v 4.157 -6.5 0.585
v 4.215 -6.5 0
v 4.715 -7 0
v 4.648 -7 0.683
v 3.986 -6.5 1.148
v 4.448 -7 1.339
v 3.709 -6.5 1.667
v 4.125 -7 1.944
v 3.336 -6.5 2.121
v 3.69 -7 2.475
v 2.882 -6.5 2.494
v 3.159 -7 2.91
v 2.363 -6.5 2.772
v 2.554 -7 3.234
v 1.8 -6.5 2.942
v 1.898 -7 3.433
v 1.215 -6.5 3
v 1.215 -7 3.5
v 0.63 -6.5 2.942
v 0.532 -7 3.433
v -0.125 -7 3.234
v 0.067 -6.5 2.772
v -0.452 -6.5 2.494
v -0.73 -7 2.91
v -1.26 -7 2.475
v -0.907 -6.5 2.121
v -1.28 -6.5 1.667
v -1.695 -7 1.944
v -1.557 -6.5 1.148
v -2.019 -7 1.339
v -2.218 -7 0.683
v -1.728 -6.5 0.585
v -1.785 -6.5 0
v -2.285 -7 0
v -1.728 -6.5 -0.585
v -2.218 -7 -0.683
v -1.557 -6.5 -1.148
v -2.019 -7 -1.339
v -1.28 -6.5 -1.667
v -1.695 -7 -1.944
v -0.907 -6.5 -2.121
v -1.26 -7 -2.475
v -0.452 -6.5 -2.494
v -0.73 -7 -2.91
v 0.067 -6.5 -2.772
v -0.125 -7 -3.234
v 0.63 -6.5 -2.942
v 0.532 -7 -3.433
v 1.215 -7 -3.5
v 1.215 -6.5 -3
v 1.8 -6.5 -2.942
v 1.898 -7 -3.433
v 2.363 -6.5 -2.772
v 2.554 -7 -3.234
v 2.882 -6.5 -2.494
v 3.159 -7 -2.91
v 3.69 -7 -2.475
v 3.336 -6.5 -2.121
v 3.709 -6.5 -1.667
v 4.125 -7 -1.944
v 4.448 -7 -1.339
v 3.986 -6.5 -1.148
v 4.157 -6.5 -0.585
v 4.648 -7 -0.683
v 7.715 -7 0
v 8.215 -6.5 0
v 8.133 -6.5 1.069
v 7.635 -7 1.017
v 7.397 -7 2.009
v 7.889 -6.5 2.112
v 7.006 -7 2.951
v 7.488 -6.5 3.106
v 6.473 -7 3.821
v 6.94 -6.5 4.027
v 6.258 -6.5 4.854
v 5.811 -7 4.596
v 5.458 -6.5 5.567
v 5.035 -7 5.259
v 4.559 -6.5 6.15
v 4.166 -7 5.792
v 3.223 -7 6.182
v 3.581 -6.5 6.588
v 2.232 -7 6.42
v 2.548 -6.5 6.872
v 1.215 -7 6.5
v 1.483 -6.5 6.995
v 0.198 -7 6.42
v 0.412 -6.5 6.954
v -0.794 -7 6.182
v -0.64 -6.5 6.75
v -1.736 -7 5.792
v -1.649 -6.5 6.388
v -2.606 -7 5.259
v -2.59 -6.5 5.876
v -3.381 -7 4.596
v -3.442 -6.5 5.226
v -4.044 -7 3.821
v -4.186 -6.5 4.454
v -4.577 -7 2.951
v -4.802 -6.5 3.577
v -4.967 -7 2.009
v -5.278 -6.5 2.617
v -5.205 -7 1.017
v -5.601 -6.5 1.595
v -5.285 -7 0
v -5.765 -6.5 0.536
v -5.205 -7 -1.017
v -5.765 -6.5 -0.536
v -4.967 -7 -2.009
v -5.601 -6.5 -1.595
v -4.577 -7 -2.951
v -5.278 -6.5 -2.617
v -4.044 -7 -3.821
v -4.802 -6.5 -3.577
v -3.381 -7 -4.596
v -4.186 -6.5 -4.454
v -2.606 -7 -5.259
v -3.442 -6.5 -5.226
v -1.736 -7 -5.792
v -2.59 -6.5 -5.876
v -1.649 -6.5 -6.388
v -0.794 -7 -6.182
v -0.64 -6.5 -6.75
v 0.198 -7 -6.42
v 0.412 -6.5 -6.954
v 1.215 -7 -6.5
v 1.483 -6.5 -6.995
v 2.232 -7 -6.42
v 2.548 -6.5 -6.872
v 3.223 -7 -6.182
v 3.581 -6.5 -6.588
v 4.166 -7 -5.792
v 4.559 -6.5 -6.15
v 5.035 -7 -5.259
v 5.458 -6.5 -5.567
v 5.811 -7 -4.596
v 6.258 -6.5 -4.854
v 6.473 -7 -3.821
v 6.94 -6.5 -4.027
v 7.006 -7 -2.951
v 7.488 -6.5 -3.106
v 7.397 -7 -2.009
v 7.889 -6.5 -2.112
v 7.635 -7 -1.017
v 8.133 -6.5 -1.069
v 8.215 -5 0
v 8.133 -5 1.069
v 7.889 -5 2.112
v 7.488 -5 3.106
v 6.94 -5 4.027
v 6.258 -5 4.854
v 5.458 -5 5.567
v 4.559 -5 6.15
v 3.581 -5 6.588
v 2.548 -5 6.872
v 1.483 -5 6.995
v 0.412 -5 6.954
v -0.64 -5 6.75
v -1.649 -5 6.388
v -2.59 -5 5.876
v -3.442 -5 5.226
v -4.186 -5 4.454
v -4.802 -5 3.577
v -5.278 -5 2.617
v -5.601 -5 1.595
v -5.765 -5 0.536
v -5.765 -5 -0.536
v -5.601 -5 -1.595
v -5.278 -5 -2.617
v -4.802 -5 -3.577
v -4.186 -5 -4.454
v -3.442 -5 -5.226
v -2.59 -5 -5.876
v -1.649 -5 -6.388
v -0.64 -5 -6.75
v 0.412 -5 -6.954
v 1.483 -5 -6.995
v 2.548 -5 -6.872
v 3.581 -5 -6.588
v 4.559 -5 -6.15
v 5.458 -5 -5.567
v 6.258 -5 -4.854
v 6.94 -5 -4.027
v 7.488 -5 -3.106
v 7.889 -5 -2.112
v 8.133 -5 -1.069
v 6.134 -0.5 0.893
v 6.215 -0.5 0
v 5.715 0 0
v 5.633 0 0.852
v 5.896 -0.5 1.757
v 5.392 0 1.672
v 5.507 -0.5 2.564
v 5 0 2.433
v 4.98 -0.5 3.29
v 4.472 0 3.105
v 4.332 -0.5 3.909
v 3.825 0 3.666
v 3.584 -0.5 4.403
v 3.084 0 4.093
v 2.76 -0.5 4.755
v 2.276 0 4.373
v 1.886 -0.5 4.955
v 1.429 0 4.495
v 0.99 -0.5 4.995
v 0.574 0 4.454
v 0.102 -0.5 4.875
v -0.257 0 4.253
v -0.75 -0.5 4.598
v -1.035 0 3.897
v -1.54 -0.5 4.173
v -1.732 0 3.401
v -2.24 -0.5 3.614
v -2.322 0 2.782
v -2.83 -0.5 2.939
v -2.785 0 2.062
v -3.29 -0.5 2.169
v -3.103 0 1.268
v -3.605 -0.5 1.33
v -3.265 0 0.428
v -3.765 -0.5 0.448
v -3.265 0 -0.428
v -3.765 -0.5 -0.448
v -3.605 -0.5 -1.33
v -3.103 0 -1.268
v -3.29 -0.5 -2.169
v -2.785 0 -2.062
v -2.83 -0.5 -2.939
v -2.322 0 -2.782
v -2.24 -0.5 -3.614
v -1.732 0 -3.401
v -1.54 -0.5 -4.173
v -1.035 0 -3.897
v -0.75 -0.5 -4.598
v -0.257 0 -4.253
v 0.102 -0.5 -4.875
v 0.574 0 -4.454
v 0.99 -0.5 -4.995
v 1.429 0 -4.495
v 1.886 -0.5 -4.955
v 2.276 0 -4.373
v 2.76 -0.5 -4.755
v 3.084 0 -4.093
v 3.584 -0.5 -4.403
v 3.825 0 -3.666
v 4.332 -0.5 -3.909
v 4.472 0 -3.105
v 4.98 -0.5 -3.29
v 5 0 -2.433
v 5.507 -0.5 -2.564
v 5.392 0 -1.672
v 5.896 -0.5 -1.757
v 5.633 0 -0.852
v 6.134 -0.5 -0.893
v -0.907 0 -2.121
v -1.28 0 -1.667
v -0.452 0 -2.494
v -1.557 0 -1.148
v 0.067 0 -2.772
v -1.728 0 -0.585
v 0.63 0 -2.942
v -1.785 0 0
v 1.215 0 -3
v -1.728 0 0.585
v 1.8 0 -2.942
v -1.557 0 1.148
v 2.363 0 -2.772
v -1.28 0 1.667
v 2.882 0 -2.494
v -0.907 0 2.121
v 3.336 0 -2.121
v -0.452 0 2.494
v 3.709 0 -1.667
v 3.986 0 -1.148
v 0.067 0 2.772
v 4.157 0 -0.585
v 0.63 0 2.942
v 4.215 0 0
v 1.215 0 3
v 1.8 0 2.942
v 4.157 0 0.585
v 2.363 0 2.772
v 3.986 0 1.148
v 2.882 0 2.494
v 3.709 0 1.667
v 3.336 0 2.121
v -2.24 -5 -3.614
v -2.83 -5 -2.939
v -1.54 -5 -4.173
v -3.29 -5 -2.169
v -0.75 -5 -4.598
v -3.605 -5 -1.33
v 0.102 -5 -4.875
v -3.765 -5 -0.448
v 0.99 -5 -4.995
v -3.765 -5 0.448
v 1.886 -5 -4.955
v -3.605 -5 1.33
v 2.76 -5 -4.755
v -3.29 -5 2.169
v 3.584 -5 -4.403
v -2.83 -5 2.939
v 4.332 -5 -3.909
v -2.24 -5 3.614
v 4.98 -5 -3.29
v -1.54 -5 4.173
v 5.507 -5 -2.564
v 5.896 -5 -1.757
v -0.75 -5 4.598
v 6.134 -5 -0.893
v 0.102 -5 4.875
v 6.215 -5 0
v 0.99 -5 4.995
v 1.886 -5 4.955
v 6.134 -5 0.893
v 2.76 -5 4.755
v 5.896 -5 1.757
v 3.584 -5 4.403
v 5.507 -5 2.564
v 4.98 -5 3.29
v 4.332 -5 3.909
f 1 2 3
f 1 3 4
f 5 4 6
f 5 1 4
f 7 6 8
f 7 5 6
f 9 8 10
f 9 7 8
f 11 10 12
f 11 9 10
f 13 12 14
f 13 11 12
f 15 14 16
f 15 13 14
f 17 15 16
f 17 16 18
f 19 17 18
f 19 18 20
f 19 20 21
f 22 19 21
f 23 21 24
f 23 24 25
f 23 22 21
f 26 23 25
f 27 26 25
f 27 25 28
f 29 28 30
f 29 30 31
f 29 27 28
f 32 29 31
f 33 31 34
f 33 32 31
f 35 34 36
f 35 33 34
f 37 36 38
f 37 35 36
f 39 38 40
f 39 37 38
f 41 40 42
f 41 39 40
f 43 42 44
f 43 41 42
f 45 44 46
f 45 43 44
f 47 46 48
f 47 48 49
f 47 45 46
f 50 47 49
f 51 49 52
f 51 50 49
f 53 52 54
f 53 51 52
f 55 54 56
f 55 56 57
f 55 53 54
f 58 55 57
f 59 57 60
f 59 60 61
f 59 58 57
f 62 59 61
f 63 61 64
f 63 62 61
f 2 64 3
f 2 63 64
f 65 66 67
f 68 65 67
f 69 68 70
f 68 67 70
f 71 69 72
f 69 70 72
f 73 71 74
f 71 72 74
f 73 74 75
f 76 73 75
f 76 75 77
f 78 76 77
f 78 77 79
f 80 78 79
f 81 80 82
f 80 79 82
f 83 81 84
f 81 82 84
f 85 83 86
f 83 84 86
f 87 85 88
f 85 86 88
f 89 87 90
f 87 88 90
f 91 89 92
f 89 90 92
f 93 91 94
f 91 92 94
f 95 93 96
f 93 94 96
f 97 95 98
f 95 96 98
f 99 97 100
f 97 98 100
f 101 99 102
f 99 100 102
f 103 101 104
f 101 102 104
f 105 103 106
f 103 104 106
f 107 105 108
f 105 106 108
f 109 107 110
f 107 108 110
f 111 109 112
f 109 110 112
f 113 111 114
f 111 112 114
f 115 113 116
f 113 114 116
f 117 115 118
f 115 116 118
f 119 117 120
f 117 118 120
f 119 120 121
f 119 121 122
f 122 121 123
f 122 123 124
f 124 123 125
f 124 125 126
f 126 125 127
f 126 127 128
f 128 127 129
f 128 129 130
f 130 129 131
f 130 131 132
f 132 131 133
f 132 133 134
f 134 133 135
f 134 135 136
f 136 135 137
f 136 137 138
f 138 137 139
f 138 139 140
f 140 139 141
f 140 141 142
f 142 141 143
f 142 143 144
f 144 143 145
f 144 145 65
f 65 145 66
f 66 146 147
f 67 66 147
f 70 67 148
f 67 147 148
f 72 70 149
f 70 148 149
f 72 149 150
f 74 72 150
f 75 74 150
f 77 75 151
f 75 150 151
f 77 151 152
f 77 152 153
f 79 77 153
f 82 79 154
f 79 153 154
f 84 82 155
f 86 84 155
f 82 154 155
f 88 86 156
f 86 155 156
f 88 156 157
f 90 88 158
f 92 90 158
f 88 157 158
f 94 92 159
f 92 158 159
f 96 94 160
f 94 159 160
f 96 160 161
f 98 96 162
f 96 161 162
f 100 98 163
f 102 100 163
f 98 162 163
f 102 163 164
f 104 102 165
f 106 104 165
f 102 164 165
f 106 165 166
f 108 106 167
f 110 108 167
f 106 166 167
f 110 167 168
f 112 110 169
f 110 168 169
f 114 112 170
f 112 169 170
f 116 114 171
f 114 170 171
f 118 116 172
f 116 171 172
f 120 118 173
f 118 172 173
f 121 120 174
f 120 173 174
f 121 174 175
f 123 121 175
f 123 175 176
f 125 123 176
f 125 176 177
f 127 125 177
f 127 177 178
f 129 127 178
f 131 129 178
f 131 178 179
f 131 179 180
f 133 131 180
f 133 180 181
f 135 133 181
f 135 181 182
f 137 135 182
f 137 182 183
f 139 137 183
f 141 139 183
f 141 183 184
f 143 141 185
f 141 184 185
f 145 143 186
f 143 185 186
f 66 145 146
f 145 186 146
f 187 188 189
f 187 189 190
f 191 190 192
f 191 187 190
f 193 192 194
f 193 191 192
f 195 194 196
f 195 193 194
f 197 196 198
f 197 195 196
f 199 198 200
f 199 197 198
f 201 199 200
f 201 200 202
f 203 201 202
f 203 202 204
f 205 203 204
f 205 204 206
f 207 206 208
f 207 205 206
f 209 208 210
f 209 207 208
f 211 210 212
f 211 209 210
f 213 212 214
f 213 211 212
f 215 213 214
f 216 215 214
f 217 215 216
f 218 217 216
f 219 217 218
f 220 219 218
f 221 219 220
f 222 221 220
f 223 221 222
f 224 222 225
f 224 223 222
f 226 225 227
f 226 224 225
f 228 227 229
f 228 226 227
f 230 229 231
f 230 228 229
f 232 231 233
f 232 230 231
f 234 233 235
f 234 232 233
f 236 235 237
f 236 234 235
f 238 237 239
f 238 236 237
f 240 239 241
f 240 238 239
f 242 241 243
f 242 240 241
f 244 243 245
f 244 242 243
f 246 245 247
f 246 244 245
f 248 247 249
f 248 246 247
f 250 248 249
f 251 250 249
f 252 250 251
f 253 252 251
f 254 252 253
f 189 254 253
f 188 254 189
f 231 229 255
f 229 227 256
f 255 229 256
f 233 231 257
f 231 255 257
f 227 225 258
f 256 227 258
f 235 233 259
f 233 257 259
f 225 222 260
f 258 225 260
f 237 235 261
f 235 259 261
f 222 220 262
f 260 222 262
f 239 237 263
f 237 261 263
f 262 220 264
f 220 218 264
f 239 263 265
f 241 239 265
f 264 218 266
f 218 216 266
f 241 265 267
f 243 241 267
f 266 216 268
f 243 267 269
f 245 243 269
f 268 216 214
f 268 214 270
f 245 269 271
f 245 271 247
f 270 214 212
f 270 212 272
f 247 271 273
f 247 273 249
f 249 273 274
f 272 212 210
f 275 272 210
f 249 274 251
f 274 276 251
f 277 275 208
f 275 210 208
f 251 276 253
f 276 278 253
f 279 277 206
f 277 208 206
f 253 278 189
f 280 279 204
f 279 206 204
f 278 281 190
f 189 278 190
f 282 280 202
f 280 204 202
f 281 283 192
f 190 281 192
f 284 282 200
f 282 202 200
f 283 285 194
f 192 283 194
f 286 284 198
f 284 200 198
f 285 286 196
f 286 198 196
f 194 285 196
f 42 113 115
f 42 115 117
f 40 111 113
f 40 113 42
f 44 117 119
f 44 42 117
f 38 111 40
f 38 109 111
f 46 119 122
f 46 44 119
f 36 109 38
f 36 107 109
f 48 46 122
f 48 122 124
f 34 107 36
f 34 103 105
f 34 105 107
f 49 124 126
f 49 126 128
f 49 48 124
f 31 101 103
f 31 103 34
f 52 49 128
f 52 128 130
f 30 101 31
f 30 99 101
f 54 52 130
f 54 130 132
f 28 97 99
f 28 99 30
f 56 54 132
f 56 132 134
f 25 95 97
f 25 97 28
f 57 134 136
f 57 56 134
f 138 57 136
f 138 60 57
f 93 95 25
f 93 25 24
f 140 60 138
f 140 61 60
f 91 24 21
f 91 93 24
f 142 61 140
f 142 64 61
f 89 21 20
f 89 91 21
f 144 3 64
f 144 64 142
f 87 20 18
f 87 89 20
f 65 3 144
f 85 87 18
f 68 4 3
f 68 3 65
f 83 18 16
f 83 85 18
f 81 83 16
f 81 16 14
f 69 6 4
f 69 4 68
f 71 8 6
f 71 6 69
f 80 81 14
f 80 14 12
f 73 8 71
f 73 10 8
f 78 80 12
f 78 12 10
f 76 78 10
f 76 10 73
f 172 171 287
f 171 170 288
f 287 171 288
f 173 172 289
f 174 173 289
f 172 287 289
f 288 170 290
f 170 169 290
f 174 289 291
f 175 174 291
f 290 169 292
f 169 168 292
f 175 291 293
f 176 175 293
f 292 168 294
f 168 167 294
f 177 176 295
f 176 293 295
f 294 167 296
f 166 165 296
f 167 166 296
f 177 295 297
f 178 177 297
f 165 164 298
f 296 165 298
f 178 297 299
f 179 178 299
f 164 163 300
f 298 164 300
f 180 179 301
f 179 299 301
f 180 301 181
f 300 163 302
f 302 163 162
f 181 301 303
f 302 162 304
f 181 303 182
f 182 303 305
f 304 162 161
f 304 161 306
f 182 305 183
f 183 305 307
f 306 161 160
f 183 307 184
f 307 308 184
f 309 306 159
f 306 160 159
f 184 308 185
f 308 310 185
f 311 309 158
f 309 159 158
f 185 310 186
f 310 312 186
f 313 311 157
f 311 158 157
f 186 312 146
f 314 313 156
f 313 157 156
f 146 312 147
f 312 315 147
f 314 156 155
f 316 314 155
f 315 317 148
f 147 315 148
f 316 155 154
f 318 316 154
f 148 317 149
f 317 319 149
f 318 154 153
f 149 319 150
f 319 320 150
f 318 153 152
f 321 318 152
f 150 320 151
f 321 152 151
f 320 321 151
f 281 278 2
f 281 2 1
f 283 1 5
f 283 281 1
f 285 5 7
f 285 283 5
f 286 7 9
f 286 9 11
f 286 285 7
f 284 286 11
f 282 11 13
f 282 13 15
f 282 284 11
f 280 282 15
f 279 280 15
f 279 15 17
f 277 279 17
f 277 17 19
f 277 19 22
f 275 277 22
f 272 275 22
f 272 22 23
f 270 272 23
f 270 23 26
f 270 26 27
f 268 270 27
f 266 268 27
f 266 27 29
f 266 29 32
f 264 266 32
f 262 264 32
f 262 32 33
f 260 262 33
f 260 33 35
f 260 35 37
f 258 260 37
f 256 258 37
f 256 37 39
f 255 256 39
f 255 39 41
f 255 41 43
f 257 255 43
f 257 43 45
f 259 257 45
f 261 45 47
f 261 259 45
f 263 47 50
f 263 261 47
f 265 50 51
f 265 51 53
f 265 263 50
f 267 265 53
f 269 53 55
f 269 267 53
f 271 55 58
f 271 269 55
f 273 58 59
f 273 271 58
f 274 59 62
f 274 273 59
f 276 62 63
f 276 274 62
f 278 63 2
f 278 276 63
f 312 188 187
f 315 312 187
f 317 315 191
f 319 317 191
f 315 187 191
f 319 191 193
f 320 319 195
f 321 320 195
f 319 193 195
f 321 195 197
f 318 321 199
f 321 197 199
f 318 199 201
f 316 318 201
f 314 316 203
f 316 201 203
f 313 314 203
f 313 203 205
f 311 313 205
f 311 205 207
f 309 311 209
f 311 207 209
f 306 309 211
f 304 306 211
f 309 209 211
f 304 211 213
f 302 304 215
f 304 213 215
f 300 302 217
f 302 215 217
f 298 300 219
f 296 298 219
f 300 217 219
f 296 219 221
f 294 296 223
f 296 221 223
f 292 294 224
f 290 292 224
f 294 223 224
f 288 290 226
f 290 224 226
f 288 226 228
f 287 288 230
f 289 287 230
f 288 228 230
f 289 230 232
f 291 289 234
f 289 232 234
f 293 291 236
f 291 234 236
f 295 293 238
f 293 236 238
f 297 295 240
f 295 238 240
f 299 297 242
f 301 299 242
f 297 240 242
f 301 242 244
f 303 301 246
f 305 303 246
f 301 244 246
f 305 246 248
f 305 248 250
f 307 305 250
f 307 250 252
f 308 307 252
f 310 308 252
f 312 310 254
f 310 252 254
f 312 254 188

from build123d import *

# Parameters (mm, degrees)
F0_R     = 5
F0_R_2   = 3
F1_DEPTH = 5
F2_R     = 6.9999998716
F2_R_2   = 5
F2_R_3   = 3
F3_DEPTH = 2
F4_SIZE  = 0.5
F5_SIZE  = 0.5
F6_SIZE  = 0.5


with BuildPart() as f1:
    # F0 (on Front) → F1 (new body)
    with BuildSketch(Plane.XZ):
        with Locations((1.2148135622, 0)):
            Circle(F0_R)
        with Locations((1.2148135622, 0)):
            Circle(F0_R_2, mode=Mode.SUBTRACT)
    extrude(amount=F1_DEPTH)

    # F2 (on face) → F3 (join)
    with BuildSketch(Plane.XZ.offset(5)):
        with Locations((1.2148135622, 0)):
            Circle(F2_R)
        with Locations((1.2148135622, 0)):
            Circle(F2_R_2, mode=Mode.SUBTRACT)
        with Locations((1.2148135622, 0)):
            Circle(F2_R_2)
        with Locations((1.2148135622, 0)):
            Circle(F2_R_3, mode=Mode.SUBTRACT)
    extrude(amount=F3_DEPTH)

    # F4
    f4_edges = [f1.edges().sort_by_distance(p)[0] for p in [
        (-1.785186, -7, 0),
    ]]
    chamfer(f4_edges, length=F4_SIZE)

    # F5
    f5_edges = [f1.edges().sort_by_distance(p)[0] for p in [
        (-5.785186, -7, 0),
    ]]
    chamfer(f5_edges, length=F5_SIZE)

    # F6
    f6_edges = [f1.edges().sort_by_distance(p)[0] for p in [
        (-3.785186, 0, 0),
    ]]
    chamfer(f6_edges, length=F6_SIZE)


solid = f1.part
